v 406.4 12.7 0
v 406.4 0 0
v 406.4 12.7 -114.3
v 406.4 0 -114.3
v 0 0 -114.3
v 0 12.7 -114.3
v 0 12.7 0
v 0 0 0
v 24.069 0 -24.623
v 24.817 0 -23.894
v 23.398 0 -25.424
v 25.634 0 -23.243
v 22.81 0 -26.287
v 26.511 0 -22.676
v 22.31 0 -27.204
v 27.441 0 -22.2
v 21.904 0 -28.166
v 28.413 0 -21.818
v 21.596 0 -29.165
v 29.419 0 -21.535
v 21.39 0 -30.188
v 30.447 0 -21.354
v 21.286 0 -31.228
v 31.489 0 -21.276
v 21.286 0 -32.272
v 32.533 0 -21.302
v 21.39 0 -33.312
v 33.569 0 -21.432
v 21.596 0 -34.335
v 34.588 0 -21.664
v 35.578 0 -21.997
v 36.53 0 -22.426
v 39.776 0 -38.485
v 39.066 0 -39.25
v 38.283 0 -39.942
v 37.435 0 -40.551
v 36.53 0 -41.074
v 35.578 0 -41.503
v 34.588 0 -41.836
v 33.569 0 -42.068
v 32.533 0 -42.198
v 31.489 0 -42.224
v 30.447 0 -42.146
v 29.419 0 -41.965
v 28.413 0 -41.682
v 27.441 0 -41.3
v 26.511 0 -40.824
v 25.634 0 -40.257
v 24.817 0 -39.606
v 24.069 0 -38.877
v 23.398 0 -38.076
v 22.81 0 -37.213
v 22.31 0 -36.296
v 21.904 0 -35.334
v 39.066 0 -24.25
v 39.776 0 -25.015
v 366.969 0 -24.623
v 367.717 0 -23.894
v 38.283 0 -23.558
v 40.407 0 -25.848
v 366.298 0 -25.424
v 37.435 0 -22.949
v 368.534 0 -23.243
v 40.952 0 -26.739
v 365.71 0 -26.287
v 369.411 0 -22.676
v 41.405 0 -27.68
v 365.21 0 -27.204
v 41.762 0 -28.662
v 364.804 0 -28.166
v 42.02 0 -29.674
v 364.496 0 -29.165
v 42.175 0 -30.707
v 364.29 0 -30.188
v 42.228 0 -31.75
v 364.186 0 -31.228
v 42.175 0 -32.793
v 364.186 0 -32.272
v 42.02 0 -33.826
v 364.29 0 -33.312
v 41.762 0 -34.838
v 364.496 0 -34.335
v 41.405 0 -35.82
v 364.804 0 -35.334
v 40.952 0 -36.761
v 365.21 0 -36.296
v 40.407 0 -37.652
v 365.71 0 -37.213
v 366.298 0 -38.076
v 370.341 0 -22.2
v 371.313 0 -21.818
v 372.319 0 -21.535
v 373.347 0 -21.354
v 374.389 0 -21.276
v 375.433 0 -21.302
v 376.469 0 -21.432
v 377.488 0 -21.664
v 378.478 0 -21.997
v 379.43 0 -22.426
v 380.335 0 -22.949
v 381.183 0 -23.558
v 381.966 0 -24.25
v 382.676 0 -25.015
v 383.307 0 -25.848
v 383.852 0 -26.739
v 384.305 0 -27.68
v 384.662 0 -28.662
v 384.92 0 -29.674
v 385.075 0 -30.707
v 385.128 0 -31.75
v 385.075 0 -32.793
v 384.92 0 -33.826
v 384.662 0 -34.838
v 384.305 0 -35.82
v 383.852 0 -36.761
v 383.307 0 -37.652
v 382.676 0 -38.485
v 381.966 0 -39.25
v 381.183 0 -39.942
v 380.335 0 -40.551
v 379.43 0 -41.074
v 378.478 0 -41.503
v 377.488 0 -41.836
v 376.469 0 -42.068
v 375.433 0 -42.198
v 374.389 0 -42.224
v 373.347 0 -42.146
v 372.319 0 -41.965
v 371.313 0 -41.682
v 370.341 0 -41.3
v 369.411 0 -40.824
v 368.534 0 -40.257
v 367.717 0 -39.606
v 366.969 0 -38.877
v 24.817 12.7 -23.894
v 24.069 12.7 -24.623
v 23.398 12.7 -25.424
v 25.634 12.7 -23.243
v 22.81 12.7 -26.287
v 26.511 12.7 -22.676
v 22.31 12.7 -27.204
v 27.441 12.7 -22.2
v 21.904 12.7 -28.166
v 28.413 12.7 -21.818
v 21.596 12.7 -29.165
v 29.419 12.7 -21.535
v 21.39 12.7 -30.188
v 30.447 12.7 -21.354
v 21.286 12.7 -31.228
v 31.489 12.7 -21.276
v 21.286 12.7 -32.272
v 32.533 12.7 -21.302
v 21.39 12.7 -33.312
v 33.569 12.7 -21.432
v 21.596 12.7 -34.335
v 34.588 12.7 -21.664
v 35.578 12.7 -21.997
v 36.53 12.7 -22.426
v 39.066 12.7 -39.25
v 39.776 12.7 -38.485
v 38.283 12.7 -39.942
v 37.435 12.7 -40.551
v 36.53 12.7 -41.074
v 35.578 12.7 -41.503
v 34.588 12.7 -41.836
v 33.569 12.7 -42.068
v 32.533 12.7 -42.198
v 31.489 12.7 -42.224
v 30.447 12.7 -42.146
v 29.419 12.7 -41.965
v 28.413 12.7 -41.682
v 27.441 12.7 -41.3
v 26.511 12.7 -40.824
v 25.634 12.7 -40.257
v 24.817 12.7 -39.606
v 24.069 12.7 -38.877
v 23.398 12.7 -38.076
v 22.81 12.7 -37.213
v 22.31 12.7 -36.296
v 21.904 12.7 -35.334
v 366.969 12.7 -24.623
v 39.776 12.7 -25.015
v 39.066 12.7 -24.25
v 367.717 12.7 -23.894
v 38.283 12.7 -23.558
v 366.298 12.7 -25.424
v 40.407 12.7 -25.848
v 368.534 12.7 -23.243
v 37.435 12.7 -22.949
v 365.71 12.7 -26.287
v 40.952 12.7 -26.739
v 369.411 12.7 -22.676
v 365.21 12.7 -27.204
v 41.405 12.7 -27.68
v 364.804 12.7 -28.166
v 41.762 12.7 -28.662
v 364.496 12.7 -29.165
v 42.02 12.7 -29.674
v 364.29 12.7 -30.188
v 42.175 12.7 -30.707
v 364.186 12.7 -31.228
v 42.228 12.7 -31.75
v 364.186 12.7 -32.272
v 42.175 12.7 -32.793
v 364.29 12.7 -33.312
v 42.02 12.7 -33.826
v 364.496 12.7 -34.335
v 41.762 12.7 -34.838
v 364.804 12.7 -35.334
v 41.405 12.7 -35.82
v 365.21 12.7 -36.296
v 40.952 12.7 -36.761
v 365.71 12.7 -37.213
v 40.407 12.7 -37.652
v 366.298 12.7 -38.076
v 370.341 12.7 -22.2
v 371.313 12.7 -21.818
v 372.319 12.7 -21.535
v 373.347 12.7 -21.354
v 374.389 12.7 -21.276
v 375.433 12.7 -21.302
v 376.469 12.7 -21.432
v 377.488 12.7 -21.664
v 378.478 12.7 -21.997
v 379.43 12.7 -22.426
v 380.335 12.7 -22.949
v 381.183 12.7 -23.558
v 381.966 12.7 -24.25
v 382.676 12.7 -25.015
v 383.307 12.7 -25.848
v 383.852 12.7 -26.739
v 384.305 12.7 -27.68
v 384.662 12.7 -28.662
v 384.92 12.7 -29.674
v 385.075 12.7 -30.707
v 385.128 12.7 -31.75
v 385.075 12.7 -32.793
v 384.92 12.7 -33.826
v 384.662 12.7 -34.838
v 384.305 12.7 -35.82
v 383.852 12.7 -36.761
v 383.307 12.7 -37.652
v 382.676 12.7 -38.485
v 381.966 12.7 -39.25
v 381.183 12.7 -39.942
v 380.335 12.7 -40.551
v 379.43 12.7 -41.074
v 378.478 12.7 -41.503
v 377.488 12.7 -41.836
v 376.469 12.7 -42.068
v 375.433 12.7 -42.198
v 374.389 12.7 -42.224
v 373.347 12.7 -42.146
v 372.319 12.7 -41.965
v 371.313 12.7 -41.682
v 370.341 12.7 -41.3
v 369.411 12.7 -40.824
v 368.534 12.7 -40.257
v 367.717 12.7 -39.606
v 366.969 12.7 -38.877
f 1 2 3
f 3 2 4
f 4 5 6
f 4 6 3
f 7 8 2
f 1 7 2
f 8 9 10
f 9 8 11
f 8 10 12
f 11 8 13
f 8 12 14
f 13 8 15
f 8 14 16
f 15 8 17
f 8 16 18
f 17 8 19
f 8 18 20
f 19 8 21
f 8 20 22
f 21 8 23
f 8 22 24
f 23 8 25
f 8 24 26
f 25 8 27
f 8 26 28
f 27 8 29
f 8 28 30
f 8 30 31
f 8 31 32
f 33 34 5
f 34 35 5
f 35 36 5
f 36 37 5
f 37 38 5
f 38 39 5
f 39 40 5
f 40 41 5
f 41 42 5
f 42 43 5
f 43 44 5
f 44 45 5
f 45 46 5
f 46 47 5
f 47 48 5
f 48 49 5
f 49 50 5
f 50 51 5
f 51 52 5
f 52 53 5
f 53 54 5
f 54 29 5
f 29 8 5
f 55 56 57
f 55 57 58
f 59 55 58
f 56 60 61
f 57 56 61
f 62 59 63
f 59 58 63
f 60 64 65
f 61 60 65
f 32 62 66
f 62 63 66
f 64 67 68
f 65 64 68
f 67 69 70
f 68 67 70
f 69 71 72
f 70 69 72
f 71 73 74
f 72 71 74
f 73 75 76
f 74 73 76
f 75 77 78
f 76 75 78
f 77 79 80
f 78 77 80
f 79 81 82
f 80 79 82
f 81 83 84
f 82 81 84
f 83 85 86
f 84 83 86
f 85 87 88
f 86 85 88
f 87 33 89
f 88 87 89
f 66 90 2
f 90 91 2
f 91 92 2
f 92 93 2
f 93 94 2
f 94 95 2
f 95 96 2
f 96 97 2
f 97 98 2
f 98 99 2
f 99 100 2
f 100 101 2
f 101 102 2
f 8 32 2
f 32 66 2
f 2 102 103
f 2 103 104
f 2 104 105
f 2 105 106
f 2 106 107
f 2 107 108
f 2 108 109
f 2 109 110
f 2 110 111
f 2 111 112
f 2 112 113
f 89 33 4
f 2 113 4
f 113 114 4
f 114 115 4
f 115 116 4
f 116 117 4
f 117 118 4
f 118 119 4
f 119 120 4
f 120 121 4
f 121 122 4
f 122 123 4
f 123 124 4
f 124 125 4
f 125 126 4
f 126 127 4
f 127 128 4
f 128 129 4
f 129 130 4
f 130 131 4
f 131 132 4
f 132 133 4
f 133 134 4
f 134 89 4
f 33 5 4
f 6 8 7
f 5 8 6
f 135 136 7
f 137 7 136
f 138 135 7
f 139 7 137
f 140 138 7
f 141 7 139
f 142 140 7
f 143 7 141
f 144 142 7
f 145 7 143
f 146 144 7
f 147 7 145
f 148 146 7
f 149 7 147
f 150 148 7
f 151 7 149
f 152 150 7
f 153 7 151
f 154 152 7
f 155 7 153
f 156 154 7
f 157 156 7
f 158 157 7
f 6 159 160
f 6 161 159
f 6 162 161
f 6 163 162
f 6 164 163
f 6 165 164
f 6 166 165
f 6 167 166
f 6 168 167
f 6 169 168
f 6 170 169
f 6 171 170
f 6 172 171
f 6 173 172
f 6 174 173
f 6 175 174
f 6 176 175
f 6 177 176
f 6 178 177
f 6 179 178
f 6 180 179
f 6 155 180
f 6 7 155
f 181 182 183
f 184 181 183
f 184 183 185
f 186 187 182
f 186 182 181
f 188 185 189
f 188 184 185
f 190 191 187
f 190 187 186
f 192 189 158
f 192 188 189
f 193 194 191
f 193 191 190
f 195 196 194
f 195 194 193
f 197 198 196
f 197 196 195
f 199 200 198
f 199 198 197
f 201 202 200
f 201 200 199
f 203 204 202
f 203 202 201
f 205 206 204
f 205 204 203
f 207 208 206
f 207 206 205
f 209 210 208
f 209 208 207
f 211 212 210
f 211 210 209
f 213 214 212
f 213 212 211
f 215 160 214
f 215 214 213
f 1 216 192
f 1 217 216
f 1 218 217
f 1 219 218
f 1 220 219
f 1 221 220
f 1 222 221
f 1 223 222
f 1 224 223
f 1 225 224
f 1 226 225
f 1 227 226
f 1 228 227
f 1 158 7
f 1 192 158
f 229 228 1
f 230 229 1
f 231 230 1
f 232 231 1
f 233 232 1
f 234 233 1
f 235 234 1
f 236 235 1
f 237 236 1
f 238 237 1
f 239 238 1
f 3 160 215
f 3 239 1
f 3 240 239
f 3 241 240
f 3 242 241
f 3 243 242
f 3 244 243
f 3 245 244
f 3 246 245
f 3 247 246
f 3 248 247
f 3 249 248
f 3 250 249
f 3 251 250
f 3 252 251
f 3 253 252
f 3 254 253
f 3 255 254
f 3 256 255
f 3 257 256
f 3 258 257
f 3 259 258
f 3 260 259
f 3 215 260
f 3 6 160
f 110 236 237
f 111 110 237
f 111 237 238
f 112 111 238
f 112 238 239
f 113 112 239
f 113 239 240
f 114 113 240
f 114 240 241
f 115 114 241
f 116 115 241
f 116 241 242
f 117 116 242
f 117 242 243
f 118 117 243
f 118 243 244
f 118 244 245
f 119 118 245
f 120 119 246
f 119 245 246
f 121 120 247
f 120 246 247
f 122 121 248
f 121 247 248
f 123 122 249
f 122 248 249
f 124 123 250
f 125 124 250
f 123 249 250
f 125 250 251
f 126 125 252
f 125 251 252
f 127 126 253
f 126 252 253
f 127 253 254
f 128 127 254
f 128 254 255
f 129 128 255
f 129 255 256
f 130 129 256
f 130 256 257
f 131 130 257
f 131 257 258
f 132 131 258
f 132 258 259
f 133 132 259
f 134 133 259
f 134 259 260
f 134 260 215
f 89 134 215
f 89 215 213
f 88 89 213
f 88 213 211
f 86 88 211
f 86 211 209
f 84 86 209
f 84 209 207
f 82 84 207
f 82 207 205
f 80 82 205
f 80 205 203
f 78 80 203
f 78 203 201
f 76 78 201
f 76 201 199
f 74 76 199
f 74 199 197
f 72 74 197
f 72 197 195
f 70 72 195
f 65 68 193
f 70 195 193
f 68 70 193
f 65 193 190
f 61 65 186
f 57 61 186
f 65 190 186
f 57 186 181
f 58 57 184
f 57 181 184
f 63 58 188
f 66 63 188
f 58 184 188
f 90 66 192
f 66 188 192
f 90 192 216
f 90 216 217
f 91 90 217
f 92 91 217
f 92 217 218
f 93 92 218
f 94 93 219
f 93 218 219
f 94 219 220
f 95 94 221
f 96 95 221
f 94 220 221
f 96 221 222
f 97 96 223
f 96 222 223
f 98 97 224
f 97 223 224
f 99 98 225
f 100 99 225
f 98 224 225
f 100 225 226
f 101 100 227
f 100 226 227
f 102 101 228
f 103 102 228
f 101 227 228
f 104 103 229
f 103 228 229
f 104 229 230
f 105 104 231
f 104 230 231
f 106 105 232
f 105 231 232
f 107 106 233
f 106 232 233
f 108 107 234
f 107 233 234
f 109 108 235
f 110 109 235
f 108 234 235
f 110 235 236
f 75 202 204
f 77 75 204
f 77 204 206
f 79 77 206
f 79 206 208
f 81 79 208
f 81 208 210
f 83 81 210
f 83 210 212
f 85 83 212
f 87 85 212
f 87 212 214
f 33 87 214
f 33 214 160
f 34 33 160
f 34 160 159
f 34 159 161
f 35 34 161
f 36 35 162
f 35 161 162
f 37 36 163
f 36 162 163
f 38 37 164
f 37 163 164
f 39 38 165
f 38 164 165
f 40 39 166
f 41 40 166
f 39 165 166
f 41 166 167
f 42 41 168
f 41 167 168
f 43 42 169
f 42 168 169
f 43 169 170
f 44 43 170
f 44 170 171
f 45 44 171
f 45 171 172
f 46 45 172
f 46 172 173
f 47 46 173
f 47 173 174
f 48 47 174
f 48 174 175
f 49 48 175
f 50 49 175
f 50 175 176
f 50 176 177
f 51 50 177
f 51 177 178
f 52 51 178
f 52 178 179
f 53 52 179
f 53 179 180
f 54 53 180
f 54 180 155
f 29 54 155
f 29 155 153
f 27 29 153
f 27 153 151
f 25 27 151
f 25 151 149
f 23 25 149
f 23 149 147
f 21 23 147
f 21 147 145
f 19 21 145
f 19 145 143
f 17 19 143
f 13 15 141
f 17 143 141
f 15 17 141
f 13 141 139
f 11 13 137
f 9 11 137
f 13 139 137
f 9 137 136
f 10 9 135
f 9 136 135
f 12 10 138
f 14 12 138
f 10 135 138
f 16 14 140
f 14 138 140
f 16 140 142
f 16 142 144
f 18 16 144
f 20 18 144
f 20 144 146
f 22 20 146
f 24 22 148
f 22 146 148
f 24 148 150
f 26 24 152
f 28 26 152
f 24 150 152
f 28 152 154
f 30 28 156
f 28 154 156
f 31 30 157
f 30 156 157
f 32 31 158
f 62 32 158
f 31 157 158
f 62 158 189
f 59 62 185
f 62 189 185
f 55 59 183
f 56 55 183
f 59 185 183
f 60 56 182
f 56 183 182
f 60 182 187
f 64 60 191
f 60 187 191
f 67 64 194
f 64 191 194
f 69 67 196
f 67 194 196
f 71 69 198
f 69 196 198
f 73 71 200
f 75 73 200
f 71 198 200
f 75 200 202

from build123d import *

# Parameters (mm, degrees)
SKETCH1_W           = 406.4
SKETCH1_H           = 114.3
BOSS_EXTRUDE1_DEPTH = 12.7
CUT_EXTRUDE1_REACH  = 14.7
SKETCH2_R           = 10.4775


with BuildPart() as part:
    # Sketch1 → Boss-Extrude1 (new body)
    with BuildSketch(Plane(origin=(0, 0, 0), x_dir=(1, 0, 0), z_dir=(0, 1, 0))):
        with Locations((203.2, 57.15)):
            Rectangle(SKETCH1_W, SKETCH1_H)
    extrude(amount=BOSS_EXTRUDE1_DEPTH)

    # Sketch2 → Cut-Extrude1 (cut, up to next)
    with BuildSketch(Plane(origin=(0, 12.7, 0), x_dir=(1, 0, 0), z_dir=(0, 1, 0)), mode=Mode.PRIVATE) as cut_extrude1_sk1:
        with Locations((31.75, 31.75)):
            Circle(SKETCH2_R)
    cut_extrude1_tool1 = extrude(cut_extrude1_sk1.sketch, amount=-CUT_EXTRUDE1_REACH, mode=Mode.PRIVATE) & part.part
    add(cut_extrude1_tool1.solids().sort_by_distance((31.75, 12.7, -31.75))[0], mode=Mode.SUBTRACT)
    # Sketch2 → Cut-Extrude1 (cut, up to next)
    with BuildSketch(Plane(origin=(0, 12.7, 0), x_dir=(1, 0, 0), z_dir=(0, 1, 0)), mode=Mode.PRIVATE) as cut_extrude1_sk2:
        with Locations((374.65, 31.75)):
            Circle(SKETCH2_R)
    cut_extrude1_tool2 = extrude(cut_extrude1_sk2.sketch, amount=-CUT_EXTRUDE1_REACH, mode=Mode.PRIVATE) & part.part
    add(cut_extrude1_tool2.solids().sort_by_distance((374.65, 12.7, -31.75))[0], mode=Mode.SUBTRACT)


solid = part.part
